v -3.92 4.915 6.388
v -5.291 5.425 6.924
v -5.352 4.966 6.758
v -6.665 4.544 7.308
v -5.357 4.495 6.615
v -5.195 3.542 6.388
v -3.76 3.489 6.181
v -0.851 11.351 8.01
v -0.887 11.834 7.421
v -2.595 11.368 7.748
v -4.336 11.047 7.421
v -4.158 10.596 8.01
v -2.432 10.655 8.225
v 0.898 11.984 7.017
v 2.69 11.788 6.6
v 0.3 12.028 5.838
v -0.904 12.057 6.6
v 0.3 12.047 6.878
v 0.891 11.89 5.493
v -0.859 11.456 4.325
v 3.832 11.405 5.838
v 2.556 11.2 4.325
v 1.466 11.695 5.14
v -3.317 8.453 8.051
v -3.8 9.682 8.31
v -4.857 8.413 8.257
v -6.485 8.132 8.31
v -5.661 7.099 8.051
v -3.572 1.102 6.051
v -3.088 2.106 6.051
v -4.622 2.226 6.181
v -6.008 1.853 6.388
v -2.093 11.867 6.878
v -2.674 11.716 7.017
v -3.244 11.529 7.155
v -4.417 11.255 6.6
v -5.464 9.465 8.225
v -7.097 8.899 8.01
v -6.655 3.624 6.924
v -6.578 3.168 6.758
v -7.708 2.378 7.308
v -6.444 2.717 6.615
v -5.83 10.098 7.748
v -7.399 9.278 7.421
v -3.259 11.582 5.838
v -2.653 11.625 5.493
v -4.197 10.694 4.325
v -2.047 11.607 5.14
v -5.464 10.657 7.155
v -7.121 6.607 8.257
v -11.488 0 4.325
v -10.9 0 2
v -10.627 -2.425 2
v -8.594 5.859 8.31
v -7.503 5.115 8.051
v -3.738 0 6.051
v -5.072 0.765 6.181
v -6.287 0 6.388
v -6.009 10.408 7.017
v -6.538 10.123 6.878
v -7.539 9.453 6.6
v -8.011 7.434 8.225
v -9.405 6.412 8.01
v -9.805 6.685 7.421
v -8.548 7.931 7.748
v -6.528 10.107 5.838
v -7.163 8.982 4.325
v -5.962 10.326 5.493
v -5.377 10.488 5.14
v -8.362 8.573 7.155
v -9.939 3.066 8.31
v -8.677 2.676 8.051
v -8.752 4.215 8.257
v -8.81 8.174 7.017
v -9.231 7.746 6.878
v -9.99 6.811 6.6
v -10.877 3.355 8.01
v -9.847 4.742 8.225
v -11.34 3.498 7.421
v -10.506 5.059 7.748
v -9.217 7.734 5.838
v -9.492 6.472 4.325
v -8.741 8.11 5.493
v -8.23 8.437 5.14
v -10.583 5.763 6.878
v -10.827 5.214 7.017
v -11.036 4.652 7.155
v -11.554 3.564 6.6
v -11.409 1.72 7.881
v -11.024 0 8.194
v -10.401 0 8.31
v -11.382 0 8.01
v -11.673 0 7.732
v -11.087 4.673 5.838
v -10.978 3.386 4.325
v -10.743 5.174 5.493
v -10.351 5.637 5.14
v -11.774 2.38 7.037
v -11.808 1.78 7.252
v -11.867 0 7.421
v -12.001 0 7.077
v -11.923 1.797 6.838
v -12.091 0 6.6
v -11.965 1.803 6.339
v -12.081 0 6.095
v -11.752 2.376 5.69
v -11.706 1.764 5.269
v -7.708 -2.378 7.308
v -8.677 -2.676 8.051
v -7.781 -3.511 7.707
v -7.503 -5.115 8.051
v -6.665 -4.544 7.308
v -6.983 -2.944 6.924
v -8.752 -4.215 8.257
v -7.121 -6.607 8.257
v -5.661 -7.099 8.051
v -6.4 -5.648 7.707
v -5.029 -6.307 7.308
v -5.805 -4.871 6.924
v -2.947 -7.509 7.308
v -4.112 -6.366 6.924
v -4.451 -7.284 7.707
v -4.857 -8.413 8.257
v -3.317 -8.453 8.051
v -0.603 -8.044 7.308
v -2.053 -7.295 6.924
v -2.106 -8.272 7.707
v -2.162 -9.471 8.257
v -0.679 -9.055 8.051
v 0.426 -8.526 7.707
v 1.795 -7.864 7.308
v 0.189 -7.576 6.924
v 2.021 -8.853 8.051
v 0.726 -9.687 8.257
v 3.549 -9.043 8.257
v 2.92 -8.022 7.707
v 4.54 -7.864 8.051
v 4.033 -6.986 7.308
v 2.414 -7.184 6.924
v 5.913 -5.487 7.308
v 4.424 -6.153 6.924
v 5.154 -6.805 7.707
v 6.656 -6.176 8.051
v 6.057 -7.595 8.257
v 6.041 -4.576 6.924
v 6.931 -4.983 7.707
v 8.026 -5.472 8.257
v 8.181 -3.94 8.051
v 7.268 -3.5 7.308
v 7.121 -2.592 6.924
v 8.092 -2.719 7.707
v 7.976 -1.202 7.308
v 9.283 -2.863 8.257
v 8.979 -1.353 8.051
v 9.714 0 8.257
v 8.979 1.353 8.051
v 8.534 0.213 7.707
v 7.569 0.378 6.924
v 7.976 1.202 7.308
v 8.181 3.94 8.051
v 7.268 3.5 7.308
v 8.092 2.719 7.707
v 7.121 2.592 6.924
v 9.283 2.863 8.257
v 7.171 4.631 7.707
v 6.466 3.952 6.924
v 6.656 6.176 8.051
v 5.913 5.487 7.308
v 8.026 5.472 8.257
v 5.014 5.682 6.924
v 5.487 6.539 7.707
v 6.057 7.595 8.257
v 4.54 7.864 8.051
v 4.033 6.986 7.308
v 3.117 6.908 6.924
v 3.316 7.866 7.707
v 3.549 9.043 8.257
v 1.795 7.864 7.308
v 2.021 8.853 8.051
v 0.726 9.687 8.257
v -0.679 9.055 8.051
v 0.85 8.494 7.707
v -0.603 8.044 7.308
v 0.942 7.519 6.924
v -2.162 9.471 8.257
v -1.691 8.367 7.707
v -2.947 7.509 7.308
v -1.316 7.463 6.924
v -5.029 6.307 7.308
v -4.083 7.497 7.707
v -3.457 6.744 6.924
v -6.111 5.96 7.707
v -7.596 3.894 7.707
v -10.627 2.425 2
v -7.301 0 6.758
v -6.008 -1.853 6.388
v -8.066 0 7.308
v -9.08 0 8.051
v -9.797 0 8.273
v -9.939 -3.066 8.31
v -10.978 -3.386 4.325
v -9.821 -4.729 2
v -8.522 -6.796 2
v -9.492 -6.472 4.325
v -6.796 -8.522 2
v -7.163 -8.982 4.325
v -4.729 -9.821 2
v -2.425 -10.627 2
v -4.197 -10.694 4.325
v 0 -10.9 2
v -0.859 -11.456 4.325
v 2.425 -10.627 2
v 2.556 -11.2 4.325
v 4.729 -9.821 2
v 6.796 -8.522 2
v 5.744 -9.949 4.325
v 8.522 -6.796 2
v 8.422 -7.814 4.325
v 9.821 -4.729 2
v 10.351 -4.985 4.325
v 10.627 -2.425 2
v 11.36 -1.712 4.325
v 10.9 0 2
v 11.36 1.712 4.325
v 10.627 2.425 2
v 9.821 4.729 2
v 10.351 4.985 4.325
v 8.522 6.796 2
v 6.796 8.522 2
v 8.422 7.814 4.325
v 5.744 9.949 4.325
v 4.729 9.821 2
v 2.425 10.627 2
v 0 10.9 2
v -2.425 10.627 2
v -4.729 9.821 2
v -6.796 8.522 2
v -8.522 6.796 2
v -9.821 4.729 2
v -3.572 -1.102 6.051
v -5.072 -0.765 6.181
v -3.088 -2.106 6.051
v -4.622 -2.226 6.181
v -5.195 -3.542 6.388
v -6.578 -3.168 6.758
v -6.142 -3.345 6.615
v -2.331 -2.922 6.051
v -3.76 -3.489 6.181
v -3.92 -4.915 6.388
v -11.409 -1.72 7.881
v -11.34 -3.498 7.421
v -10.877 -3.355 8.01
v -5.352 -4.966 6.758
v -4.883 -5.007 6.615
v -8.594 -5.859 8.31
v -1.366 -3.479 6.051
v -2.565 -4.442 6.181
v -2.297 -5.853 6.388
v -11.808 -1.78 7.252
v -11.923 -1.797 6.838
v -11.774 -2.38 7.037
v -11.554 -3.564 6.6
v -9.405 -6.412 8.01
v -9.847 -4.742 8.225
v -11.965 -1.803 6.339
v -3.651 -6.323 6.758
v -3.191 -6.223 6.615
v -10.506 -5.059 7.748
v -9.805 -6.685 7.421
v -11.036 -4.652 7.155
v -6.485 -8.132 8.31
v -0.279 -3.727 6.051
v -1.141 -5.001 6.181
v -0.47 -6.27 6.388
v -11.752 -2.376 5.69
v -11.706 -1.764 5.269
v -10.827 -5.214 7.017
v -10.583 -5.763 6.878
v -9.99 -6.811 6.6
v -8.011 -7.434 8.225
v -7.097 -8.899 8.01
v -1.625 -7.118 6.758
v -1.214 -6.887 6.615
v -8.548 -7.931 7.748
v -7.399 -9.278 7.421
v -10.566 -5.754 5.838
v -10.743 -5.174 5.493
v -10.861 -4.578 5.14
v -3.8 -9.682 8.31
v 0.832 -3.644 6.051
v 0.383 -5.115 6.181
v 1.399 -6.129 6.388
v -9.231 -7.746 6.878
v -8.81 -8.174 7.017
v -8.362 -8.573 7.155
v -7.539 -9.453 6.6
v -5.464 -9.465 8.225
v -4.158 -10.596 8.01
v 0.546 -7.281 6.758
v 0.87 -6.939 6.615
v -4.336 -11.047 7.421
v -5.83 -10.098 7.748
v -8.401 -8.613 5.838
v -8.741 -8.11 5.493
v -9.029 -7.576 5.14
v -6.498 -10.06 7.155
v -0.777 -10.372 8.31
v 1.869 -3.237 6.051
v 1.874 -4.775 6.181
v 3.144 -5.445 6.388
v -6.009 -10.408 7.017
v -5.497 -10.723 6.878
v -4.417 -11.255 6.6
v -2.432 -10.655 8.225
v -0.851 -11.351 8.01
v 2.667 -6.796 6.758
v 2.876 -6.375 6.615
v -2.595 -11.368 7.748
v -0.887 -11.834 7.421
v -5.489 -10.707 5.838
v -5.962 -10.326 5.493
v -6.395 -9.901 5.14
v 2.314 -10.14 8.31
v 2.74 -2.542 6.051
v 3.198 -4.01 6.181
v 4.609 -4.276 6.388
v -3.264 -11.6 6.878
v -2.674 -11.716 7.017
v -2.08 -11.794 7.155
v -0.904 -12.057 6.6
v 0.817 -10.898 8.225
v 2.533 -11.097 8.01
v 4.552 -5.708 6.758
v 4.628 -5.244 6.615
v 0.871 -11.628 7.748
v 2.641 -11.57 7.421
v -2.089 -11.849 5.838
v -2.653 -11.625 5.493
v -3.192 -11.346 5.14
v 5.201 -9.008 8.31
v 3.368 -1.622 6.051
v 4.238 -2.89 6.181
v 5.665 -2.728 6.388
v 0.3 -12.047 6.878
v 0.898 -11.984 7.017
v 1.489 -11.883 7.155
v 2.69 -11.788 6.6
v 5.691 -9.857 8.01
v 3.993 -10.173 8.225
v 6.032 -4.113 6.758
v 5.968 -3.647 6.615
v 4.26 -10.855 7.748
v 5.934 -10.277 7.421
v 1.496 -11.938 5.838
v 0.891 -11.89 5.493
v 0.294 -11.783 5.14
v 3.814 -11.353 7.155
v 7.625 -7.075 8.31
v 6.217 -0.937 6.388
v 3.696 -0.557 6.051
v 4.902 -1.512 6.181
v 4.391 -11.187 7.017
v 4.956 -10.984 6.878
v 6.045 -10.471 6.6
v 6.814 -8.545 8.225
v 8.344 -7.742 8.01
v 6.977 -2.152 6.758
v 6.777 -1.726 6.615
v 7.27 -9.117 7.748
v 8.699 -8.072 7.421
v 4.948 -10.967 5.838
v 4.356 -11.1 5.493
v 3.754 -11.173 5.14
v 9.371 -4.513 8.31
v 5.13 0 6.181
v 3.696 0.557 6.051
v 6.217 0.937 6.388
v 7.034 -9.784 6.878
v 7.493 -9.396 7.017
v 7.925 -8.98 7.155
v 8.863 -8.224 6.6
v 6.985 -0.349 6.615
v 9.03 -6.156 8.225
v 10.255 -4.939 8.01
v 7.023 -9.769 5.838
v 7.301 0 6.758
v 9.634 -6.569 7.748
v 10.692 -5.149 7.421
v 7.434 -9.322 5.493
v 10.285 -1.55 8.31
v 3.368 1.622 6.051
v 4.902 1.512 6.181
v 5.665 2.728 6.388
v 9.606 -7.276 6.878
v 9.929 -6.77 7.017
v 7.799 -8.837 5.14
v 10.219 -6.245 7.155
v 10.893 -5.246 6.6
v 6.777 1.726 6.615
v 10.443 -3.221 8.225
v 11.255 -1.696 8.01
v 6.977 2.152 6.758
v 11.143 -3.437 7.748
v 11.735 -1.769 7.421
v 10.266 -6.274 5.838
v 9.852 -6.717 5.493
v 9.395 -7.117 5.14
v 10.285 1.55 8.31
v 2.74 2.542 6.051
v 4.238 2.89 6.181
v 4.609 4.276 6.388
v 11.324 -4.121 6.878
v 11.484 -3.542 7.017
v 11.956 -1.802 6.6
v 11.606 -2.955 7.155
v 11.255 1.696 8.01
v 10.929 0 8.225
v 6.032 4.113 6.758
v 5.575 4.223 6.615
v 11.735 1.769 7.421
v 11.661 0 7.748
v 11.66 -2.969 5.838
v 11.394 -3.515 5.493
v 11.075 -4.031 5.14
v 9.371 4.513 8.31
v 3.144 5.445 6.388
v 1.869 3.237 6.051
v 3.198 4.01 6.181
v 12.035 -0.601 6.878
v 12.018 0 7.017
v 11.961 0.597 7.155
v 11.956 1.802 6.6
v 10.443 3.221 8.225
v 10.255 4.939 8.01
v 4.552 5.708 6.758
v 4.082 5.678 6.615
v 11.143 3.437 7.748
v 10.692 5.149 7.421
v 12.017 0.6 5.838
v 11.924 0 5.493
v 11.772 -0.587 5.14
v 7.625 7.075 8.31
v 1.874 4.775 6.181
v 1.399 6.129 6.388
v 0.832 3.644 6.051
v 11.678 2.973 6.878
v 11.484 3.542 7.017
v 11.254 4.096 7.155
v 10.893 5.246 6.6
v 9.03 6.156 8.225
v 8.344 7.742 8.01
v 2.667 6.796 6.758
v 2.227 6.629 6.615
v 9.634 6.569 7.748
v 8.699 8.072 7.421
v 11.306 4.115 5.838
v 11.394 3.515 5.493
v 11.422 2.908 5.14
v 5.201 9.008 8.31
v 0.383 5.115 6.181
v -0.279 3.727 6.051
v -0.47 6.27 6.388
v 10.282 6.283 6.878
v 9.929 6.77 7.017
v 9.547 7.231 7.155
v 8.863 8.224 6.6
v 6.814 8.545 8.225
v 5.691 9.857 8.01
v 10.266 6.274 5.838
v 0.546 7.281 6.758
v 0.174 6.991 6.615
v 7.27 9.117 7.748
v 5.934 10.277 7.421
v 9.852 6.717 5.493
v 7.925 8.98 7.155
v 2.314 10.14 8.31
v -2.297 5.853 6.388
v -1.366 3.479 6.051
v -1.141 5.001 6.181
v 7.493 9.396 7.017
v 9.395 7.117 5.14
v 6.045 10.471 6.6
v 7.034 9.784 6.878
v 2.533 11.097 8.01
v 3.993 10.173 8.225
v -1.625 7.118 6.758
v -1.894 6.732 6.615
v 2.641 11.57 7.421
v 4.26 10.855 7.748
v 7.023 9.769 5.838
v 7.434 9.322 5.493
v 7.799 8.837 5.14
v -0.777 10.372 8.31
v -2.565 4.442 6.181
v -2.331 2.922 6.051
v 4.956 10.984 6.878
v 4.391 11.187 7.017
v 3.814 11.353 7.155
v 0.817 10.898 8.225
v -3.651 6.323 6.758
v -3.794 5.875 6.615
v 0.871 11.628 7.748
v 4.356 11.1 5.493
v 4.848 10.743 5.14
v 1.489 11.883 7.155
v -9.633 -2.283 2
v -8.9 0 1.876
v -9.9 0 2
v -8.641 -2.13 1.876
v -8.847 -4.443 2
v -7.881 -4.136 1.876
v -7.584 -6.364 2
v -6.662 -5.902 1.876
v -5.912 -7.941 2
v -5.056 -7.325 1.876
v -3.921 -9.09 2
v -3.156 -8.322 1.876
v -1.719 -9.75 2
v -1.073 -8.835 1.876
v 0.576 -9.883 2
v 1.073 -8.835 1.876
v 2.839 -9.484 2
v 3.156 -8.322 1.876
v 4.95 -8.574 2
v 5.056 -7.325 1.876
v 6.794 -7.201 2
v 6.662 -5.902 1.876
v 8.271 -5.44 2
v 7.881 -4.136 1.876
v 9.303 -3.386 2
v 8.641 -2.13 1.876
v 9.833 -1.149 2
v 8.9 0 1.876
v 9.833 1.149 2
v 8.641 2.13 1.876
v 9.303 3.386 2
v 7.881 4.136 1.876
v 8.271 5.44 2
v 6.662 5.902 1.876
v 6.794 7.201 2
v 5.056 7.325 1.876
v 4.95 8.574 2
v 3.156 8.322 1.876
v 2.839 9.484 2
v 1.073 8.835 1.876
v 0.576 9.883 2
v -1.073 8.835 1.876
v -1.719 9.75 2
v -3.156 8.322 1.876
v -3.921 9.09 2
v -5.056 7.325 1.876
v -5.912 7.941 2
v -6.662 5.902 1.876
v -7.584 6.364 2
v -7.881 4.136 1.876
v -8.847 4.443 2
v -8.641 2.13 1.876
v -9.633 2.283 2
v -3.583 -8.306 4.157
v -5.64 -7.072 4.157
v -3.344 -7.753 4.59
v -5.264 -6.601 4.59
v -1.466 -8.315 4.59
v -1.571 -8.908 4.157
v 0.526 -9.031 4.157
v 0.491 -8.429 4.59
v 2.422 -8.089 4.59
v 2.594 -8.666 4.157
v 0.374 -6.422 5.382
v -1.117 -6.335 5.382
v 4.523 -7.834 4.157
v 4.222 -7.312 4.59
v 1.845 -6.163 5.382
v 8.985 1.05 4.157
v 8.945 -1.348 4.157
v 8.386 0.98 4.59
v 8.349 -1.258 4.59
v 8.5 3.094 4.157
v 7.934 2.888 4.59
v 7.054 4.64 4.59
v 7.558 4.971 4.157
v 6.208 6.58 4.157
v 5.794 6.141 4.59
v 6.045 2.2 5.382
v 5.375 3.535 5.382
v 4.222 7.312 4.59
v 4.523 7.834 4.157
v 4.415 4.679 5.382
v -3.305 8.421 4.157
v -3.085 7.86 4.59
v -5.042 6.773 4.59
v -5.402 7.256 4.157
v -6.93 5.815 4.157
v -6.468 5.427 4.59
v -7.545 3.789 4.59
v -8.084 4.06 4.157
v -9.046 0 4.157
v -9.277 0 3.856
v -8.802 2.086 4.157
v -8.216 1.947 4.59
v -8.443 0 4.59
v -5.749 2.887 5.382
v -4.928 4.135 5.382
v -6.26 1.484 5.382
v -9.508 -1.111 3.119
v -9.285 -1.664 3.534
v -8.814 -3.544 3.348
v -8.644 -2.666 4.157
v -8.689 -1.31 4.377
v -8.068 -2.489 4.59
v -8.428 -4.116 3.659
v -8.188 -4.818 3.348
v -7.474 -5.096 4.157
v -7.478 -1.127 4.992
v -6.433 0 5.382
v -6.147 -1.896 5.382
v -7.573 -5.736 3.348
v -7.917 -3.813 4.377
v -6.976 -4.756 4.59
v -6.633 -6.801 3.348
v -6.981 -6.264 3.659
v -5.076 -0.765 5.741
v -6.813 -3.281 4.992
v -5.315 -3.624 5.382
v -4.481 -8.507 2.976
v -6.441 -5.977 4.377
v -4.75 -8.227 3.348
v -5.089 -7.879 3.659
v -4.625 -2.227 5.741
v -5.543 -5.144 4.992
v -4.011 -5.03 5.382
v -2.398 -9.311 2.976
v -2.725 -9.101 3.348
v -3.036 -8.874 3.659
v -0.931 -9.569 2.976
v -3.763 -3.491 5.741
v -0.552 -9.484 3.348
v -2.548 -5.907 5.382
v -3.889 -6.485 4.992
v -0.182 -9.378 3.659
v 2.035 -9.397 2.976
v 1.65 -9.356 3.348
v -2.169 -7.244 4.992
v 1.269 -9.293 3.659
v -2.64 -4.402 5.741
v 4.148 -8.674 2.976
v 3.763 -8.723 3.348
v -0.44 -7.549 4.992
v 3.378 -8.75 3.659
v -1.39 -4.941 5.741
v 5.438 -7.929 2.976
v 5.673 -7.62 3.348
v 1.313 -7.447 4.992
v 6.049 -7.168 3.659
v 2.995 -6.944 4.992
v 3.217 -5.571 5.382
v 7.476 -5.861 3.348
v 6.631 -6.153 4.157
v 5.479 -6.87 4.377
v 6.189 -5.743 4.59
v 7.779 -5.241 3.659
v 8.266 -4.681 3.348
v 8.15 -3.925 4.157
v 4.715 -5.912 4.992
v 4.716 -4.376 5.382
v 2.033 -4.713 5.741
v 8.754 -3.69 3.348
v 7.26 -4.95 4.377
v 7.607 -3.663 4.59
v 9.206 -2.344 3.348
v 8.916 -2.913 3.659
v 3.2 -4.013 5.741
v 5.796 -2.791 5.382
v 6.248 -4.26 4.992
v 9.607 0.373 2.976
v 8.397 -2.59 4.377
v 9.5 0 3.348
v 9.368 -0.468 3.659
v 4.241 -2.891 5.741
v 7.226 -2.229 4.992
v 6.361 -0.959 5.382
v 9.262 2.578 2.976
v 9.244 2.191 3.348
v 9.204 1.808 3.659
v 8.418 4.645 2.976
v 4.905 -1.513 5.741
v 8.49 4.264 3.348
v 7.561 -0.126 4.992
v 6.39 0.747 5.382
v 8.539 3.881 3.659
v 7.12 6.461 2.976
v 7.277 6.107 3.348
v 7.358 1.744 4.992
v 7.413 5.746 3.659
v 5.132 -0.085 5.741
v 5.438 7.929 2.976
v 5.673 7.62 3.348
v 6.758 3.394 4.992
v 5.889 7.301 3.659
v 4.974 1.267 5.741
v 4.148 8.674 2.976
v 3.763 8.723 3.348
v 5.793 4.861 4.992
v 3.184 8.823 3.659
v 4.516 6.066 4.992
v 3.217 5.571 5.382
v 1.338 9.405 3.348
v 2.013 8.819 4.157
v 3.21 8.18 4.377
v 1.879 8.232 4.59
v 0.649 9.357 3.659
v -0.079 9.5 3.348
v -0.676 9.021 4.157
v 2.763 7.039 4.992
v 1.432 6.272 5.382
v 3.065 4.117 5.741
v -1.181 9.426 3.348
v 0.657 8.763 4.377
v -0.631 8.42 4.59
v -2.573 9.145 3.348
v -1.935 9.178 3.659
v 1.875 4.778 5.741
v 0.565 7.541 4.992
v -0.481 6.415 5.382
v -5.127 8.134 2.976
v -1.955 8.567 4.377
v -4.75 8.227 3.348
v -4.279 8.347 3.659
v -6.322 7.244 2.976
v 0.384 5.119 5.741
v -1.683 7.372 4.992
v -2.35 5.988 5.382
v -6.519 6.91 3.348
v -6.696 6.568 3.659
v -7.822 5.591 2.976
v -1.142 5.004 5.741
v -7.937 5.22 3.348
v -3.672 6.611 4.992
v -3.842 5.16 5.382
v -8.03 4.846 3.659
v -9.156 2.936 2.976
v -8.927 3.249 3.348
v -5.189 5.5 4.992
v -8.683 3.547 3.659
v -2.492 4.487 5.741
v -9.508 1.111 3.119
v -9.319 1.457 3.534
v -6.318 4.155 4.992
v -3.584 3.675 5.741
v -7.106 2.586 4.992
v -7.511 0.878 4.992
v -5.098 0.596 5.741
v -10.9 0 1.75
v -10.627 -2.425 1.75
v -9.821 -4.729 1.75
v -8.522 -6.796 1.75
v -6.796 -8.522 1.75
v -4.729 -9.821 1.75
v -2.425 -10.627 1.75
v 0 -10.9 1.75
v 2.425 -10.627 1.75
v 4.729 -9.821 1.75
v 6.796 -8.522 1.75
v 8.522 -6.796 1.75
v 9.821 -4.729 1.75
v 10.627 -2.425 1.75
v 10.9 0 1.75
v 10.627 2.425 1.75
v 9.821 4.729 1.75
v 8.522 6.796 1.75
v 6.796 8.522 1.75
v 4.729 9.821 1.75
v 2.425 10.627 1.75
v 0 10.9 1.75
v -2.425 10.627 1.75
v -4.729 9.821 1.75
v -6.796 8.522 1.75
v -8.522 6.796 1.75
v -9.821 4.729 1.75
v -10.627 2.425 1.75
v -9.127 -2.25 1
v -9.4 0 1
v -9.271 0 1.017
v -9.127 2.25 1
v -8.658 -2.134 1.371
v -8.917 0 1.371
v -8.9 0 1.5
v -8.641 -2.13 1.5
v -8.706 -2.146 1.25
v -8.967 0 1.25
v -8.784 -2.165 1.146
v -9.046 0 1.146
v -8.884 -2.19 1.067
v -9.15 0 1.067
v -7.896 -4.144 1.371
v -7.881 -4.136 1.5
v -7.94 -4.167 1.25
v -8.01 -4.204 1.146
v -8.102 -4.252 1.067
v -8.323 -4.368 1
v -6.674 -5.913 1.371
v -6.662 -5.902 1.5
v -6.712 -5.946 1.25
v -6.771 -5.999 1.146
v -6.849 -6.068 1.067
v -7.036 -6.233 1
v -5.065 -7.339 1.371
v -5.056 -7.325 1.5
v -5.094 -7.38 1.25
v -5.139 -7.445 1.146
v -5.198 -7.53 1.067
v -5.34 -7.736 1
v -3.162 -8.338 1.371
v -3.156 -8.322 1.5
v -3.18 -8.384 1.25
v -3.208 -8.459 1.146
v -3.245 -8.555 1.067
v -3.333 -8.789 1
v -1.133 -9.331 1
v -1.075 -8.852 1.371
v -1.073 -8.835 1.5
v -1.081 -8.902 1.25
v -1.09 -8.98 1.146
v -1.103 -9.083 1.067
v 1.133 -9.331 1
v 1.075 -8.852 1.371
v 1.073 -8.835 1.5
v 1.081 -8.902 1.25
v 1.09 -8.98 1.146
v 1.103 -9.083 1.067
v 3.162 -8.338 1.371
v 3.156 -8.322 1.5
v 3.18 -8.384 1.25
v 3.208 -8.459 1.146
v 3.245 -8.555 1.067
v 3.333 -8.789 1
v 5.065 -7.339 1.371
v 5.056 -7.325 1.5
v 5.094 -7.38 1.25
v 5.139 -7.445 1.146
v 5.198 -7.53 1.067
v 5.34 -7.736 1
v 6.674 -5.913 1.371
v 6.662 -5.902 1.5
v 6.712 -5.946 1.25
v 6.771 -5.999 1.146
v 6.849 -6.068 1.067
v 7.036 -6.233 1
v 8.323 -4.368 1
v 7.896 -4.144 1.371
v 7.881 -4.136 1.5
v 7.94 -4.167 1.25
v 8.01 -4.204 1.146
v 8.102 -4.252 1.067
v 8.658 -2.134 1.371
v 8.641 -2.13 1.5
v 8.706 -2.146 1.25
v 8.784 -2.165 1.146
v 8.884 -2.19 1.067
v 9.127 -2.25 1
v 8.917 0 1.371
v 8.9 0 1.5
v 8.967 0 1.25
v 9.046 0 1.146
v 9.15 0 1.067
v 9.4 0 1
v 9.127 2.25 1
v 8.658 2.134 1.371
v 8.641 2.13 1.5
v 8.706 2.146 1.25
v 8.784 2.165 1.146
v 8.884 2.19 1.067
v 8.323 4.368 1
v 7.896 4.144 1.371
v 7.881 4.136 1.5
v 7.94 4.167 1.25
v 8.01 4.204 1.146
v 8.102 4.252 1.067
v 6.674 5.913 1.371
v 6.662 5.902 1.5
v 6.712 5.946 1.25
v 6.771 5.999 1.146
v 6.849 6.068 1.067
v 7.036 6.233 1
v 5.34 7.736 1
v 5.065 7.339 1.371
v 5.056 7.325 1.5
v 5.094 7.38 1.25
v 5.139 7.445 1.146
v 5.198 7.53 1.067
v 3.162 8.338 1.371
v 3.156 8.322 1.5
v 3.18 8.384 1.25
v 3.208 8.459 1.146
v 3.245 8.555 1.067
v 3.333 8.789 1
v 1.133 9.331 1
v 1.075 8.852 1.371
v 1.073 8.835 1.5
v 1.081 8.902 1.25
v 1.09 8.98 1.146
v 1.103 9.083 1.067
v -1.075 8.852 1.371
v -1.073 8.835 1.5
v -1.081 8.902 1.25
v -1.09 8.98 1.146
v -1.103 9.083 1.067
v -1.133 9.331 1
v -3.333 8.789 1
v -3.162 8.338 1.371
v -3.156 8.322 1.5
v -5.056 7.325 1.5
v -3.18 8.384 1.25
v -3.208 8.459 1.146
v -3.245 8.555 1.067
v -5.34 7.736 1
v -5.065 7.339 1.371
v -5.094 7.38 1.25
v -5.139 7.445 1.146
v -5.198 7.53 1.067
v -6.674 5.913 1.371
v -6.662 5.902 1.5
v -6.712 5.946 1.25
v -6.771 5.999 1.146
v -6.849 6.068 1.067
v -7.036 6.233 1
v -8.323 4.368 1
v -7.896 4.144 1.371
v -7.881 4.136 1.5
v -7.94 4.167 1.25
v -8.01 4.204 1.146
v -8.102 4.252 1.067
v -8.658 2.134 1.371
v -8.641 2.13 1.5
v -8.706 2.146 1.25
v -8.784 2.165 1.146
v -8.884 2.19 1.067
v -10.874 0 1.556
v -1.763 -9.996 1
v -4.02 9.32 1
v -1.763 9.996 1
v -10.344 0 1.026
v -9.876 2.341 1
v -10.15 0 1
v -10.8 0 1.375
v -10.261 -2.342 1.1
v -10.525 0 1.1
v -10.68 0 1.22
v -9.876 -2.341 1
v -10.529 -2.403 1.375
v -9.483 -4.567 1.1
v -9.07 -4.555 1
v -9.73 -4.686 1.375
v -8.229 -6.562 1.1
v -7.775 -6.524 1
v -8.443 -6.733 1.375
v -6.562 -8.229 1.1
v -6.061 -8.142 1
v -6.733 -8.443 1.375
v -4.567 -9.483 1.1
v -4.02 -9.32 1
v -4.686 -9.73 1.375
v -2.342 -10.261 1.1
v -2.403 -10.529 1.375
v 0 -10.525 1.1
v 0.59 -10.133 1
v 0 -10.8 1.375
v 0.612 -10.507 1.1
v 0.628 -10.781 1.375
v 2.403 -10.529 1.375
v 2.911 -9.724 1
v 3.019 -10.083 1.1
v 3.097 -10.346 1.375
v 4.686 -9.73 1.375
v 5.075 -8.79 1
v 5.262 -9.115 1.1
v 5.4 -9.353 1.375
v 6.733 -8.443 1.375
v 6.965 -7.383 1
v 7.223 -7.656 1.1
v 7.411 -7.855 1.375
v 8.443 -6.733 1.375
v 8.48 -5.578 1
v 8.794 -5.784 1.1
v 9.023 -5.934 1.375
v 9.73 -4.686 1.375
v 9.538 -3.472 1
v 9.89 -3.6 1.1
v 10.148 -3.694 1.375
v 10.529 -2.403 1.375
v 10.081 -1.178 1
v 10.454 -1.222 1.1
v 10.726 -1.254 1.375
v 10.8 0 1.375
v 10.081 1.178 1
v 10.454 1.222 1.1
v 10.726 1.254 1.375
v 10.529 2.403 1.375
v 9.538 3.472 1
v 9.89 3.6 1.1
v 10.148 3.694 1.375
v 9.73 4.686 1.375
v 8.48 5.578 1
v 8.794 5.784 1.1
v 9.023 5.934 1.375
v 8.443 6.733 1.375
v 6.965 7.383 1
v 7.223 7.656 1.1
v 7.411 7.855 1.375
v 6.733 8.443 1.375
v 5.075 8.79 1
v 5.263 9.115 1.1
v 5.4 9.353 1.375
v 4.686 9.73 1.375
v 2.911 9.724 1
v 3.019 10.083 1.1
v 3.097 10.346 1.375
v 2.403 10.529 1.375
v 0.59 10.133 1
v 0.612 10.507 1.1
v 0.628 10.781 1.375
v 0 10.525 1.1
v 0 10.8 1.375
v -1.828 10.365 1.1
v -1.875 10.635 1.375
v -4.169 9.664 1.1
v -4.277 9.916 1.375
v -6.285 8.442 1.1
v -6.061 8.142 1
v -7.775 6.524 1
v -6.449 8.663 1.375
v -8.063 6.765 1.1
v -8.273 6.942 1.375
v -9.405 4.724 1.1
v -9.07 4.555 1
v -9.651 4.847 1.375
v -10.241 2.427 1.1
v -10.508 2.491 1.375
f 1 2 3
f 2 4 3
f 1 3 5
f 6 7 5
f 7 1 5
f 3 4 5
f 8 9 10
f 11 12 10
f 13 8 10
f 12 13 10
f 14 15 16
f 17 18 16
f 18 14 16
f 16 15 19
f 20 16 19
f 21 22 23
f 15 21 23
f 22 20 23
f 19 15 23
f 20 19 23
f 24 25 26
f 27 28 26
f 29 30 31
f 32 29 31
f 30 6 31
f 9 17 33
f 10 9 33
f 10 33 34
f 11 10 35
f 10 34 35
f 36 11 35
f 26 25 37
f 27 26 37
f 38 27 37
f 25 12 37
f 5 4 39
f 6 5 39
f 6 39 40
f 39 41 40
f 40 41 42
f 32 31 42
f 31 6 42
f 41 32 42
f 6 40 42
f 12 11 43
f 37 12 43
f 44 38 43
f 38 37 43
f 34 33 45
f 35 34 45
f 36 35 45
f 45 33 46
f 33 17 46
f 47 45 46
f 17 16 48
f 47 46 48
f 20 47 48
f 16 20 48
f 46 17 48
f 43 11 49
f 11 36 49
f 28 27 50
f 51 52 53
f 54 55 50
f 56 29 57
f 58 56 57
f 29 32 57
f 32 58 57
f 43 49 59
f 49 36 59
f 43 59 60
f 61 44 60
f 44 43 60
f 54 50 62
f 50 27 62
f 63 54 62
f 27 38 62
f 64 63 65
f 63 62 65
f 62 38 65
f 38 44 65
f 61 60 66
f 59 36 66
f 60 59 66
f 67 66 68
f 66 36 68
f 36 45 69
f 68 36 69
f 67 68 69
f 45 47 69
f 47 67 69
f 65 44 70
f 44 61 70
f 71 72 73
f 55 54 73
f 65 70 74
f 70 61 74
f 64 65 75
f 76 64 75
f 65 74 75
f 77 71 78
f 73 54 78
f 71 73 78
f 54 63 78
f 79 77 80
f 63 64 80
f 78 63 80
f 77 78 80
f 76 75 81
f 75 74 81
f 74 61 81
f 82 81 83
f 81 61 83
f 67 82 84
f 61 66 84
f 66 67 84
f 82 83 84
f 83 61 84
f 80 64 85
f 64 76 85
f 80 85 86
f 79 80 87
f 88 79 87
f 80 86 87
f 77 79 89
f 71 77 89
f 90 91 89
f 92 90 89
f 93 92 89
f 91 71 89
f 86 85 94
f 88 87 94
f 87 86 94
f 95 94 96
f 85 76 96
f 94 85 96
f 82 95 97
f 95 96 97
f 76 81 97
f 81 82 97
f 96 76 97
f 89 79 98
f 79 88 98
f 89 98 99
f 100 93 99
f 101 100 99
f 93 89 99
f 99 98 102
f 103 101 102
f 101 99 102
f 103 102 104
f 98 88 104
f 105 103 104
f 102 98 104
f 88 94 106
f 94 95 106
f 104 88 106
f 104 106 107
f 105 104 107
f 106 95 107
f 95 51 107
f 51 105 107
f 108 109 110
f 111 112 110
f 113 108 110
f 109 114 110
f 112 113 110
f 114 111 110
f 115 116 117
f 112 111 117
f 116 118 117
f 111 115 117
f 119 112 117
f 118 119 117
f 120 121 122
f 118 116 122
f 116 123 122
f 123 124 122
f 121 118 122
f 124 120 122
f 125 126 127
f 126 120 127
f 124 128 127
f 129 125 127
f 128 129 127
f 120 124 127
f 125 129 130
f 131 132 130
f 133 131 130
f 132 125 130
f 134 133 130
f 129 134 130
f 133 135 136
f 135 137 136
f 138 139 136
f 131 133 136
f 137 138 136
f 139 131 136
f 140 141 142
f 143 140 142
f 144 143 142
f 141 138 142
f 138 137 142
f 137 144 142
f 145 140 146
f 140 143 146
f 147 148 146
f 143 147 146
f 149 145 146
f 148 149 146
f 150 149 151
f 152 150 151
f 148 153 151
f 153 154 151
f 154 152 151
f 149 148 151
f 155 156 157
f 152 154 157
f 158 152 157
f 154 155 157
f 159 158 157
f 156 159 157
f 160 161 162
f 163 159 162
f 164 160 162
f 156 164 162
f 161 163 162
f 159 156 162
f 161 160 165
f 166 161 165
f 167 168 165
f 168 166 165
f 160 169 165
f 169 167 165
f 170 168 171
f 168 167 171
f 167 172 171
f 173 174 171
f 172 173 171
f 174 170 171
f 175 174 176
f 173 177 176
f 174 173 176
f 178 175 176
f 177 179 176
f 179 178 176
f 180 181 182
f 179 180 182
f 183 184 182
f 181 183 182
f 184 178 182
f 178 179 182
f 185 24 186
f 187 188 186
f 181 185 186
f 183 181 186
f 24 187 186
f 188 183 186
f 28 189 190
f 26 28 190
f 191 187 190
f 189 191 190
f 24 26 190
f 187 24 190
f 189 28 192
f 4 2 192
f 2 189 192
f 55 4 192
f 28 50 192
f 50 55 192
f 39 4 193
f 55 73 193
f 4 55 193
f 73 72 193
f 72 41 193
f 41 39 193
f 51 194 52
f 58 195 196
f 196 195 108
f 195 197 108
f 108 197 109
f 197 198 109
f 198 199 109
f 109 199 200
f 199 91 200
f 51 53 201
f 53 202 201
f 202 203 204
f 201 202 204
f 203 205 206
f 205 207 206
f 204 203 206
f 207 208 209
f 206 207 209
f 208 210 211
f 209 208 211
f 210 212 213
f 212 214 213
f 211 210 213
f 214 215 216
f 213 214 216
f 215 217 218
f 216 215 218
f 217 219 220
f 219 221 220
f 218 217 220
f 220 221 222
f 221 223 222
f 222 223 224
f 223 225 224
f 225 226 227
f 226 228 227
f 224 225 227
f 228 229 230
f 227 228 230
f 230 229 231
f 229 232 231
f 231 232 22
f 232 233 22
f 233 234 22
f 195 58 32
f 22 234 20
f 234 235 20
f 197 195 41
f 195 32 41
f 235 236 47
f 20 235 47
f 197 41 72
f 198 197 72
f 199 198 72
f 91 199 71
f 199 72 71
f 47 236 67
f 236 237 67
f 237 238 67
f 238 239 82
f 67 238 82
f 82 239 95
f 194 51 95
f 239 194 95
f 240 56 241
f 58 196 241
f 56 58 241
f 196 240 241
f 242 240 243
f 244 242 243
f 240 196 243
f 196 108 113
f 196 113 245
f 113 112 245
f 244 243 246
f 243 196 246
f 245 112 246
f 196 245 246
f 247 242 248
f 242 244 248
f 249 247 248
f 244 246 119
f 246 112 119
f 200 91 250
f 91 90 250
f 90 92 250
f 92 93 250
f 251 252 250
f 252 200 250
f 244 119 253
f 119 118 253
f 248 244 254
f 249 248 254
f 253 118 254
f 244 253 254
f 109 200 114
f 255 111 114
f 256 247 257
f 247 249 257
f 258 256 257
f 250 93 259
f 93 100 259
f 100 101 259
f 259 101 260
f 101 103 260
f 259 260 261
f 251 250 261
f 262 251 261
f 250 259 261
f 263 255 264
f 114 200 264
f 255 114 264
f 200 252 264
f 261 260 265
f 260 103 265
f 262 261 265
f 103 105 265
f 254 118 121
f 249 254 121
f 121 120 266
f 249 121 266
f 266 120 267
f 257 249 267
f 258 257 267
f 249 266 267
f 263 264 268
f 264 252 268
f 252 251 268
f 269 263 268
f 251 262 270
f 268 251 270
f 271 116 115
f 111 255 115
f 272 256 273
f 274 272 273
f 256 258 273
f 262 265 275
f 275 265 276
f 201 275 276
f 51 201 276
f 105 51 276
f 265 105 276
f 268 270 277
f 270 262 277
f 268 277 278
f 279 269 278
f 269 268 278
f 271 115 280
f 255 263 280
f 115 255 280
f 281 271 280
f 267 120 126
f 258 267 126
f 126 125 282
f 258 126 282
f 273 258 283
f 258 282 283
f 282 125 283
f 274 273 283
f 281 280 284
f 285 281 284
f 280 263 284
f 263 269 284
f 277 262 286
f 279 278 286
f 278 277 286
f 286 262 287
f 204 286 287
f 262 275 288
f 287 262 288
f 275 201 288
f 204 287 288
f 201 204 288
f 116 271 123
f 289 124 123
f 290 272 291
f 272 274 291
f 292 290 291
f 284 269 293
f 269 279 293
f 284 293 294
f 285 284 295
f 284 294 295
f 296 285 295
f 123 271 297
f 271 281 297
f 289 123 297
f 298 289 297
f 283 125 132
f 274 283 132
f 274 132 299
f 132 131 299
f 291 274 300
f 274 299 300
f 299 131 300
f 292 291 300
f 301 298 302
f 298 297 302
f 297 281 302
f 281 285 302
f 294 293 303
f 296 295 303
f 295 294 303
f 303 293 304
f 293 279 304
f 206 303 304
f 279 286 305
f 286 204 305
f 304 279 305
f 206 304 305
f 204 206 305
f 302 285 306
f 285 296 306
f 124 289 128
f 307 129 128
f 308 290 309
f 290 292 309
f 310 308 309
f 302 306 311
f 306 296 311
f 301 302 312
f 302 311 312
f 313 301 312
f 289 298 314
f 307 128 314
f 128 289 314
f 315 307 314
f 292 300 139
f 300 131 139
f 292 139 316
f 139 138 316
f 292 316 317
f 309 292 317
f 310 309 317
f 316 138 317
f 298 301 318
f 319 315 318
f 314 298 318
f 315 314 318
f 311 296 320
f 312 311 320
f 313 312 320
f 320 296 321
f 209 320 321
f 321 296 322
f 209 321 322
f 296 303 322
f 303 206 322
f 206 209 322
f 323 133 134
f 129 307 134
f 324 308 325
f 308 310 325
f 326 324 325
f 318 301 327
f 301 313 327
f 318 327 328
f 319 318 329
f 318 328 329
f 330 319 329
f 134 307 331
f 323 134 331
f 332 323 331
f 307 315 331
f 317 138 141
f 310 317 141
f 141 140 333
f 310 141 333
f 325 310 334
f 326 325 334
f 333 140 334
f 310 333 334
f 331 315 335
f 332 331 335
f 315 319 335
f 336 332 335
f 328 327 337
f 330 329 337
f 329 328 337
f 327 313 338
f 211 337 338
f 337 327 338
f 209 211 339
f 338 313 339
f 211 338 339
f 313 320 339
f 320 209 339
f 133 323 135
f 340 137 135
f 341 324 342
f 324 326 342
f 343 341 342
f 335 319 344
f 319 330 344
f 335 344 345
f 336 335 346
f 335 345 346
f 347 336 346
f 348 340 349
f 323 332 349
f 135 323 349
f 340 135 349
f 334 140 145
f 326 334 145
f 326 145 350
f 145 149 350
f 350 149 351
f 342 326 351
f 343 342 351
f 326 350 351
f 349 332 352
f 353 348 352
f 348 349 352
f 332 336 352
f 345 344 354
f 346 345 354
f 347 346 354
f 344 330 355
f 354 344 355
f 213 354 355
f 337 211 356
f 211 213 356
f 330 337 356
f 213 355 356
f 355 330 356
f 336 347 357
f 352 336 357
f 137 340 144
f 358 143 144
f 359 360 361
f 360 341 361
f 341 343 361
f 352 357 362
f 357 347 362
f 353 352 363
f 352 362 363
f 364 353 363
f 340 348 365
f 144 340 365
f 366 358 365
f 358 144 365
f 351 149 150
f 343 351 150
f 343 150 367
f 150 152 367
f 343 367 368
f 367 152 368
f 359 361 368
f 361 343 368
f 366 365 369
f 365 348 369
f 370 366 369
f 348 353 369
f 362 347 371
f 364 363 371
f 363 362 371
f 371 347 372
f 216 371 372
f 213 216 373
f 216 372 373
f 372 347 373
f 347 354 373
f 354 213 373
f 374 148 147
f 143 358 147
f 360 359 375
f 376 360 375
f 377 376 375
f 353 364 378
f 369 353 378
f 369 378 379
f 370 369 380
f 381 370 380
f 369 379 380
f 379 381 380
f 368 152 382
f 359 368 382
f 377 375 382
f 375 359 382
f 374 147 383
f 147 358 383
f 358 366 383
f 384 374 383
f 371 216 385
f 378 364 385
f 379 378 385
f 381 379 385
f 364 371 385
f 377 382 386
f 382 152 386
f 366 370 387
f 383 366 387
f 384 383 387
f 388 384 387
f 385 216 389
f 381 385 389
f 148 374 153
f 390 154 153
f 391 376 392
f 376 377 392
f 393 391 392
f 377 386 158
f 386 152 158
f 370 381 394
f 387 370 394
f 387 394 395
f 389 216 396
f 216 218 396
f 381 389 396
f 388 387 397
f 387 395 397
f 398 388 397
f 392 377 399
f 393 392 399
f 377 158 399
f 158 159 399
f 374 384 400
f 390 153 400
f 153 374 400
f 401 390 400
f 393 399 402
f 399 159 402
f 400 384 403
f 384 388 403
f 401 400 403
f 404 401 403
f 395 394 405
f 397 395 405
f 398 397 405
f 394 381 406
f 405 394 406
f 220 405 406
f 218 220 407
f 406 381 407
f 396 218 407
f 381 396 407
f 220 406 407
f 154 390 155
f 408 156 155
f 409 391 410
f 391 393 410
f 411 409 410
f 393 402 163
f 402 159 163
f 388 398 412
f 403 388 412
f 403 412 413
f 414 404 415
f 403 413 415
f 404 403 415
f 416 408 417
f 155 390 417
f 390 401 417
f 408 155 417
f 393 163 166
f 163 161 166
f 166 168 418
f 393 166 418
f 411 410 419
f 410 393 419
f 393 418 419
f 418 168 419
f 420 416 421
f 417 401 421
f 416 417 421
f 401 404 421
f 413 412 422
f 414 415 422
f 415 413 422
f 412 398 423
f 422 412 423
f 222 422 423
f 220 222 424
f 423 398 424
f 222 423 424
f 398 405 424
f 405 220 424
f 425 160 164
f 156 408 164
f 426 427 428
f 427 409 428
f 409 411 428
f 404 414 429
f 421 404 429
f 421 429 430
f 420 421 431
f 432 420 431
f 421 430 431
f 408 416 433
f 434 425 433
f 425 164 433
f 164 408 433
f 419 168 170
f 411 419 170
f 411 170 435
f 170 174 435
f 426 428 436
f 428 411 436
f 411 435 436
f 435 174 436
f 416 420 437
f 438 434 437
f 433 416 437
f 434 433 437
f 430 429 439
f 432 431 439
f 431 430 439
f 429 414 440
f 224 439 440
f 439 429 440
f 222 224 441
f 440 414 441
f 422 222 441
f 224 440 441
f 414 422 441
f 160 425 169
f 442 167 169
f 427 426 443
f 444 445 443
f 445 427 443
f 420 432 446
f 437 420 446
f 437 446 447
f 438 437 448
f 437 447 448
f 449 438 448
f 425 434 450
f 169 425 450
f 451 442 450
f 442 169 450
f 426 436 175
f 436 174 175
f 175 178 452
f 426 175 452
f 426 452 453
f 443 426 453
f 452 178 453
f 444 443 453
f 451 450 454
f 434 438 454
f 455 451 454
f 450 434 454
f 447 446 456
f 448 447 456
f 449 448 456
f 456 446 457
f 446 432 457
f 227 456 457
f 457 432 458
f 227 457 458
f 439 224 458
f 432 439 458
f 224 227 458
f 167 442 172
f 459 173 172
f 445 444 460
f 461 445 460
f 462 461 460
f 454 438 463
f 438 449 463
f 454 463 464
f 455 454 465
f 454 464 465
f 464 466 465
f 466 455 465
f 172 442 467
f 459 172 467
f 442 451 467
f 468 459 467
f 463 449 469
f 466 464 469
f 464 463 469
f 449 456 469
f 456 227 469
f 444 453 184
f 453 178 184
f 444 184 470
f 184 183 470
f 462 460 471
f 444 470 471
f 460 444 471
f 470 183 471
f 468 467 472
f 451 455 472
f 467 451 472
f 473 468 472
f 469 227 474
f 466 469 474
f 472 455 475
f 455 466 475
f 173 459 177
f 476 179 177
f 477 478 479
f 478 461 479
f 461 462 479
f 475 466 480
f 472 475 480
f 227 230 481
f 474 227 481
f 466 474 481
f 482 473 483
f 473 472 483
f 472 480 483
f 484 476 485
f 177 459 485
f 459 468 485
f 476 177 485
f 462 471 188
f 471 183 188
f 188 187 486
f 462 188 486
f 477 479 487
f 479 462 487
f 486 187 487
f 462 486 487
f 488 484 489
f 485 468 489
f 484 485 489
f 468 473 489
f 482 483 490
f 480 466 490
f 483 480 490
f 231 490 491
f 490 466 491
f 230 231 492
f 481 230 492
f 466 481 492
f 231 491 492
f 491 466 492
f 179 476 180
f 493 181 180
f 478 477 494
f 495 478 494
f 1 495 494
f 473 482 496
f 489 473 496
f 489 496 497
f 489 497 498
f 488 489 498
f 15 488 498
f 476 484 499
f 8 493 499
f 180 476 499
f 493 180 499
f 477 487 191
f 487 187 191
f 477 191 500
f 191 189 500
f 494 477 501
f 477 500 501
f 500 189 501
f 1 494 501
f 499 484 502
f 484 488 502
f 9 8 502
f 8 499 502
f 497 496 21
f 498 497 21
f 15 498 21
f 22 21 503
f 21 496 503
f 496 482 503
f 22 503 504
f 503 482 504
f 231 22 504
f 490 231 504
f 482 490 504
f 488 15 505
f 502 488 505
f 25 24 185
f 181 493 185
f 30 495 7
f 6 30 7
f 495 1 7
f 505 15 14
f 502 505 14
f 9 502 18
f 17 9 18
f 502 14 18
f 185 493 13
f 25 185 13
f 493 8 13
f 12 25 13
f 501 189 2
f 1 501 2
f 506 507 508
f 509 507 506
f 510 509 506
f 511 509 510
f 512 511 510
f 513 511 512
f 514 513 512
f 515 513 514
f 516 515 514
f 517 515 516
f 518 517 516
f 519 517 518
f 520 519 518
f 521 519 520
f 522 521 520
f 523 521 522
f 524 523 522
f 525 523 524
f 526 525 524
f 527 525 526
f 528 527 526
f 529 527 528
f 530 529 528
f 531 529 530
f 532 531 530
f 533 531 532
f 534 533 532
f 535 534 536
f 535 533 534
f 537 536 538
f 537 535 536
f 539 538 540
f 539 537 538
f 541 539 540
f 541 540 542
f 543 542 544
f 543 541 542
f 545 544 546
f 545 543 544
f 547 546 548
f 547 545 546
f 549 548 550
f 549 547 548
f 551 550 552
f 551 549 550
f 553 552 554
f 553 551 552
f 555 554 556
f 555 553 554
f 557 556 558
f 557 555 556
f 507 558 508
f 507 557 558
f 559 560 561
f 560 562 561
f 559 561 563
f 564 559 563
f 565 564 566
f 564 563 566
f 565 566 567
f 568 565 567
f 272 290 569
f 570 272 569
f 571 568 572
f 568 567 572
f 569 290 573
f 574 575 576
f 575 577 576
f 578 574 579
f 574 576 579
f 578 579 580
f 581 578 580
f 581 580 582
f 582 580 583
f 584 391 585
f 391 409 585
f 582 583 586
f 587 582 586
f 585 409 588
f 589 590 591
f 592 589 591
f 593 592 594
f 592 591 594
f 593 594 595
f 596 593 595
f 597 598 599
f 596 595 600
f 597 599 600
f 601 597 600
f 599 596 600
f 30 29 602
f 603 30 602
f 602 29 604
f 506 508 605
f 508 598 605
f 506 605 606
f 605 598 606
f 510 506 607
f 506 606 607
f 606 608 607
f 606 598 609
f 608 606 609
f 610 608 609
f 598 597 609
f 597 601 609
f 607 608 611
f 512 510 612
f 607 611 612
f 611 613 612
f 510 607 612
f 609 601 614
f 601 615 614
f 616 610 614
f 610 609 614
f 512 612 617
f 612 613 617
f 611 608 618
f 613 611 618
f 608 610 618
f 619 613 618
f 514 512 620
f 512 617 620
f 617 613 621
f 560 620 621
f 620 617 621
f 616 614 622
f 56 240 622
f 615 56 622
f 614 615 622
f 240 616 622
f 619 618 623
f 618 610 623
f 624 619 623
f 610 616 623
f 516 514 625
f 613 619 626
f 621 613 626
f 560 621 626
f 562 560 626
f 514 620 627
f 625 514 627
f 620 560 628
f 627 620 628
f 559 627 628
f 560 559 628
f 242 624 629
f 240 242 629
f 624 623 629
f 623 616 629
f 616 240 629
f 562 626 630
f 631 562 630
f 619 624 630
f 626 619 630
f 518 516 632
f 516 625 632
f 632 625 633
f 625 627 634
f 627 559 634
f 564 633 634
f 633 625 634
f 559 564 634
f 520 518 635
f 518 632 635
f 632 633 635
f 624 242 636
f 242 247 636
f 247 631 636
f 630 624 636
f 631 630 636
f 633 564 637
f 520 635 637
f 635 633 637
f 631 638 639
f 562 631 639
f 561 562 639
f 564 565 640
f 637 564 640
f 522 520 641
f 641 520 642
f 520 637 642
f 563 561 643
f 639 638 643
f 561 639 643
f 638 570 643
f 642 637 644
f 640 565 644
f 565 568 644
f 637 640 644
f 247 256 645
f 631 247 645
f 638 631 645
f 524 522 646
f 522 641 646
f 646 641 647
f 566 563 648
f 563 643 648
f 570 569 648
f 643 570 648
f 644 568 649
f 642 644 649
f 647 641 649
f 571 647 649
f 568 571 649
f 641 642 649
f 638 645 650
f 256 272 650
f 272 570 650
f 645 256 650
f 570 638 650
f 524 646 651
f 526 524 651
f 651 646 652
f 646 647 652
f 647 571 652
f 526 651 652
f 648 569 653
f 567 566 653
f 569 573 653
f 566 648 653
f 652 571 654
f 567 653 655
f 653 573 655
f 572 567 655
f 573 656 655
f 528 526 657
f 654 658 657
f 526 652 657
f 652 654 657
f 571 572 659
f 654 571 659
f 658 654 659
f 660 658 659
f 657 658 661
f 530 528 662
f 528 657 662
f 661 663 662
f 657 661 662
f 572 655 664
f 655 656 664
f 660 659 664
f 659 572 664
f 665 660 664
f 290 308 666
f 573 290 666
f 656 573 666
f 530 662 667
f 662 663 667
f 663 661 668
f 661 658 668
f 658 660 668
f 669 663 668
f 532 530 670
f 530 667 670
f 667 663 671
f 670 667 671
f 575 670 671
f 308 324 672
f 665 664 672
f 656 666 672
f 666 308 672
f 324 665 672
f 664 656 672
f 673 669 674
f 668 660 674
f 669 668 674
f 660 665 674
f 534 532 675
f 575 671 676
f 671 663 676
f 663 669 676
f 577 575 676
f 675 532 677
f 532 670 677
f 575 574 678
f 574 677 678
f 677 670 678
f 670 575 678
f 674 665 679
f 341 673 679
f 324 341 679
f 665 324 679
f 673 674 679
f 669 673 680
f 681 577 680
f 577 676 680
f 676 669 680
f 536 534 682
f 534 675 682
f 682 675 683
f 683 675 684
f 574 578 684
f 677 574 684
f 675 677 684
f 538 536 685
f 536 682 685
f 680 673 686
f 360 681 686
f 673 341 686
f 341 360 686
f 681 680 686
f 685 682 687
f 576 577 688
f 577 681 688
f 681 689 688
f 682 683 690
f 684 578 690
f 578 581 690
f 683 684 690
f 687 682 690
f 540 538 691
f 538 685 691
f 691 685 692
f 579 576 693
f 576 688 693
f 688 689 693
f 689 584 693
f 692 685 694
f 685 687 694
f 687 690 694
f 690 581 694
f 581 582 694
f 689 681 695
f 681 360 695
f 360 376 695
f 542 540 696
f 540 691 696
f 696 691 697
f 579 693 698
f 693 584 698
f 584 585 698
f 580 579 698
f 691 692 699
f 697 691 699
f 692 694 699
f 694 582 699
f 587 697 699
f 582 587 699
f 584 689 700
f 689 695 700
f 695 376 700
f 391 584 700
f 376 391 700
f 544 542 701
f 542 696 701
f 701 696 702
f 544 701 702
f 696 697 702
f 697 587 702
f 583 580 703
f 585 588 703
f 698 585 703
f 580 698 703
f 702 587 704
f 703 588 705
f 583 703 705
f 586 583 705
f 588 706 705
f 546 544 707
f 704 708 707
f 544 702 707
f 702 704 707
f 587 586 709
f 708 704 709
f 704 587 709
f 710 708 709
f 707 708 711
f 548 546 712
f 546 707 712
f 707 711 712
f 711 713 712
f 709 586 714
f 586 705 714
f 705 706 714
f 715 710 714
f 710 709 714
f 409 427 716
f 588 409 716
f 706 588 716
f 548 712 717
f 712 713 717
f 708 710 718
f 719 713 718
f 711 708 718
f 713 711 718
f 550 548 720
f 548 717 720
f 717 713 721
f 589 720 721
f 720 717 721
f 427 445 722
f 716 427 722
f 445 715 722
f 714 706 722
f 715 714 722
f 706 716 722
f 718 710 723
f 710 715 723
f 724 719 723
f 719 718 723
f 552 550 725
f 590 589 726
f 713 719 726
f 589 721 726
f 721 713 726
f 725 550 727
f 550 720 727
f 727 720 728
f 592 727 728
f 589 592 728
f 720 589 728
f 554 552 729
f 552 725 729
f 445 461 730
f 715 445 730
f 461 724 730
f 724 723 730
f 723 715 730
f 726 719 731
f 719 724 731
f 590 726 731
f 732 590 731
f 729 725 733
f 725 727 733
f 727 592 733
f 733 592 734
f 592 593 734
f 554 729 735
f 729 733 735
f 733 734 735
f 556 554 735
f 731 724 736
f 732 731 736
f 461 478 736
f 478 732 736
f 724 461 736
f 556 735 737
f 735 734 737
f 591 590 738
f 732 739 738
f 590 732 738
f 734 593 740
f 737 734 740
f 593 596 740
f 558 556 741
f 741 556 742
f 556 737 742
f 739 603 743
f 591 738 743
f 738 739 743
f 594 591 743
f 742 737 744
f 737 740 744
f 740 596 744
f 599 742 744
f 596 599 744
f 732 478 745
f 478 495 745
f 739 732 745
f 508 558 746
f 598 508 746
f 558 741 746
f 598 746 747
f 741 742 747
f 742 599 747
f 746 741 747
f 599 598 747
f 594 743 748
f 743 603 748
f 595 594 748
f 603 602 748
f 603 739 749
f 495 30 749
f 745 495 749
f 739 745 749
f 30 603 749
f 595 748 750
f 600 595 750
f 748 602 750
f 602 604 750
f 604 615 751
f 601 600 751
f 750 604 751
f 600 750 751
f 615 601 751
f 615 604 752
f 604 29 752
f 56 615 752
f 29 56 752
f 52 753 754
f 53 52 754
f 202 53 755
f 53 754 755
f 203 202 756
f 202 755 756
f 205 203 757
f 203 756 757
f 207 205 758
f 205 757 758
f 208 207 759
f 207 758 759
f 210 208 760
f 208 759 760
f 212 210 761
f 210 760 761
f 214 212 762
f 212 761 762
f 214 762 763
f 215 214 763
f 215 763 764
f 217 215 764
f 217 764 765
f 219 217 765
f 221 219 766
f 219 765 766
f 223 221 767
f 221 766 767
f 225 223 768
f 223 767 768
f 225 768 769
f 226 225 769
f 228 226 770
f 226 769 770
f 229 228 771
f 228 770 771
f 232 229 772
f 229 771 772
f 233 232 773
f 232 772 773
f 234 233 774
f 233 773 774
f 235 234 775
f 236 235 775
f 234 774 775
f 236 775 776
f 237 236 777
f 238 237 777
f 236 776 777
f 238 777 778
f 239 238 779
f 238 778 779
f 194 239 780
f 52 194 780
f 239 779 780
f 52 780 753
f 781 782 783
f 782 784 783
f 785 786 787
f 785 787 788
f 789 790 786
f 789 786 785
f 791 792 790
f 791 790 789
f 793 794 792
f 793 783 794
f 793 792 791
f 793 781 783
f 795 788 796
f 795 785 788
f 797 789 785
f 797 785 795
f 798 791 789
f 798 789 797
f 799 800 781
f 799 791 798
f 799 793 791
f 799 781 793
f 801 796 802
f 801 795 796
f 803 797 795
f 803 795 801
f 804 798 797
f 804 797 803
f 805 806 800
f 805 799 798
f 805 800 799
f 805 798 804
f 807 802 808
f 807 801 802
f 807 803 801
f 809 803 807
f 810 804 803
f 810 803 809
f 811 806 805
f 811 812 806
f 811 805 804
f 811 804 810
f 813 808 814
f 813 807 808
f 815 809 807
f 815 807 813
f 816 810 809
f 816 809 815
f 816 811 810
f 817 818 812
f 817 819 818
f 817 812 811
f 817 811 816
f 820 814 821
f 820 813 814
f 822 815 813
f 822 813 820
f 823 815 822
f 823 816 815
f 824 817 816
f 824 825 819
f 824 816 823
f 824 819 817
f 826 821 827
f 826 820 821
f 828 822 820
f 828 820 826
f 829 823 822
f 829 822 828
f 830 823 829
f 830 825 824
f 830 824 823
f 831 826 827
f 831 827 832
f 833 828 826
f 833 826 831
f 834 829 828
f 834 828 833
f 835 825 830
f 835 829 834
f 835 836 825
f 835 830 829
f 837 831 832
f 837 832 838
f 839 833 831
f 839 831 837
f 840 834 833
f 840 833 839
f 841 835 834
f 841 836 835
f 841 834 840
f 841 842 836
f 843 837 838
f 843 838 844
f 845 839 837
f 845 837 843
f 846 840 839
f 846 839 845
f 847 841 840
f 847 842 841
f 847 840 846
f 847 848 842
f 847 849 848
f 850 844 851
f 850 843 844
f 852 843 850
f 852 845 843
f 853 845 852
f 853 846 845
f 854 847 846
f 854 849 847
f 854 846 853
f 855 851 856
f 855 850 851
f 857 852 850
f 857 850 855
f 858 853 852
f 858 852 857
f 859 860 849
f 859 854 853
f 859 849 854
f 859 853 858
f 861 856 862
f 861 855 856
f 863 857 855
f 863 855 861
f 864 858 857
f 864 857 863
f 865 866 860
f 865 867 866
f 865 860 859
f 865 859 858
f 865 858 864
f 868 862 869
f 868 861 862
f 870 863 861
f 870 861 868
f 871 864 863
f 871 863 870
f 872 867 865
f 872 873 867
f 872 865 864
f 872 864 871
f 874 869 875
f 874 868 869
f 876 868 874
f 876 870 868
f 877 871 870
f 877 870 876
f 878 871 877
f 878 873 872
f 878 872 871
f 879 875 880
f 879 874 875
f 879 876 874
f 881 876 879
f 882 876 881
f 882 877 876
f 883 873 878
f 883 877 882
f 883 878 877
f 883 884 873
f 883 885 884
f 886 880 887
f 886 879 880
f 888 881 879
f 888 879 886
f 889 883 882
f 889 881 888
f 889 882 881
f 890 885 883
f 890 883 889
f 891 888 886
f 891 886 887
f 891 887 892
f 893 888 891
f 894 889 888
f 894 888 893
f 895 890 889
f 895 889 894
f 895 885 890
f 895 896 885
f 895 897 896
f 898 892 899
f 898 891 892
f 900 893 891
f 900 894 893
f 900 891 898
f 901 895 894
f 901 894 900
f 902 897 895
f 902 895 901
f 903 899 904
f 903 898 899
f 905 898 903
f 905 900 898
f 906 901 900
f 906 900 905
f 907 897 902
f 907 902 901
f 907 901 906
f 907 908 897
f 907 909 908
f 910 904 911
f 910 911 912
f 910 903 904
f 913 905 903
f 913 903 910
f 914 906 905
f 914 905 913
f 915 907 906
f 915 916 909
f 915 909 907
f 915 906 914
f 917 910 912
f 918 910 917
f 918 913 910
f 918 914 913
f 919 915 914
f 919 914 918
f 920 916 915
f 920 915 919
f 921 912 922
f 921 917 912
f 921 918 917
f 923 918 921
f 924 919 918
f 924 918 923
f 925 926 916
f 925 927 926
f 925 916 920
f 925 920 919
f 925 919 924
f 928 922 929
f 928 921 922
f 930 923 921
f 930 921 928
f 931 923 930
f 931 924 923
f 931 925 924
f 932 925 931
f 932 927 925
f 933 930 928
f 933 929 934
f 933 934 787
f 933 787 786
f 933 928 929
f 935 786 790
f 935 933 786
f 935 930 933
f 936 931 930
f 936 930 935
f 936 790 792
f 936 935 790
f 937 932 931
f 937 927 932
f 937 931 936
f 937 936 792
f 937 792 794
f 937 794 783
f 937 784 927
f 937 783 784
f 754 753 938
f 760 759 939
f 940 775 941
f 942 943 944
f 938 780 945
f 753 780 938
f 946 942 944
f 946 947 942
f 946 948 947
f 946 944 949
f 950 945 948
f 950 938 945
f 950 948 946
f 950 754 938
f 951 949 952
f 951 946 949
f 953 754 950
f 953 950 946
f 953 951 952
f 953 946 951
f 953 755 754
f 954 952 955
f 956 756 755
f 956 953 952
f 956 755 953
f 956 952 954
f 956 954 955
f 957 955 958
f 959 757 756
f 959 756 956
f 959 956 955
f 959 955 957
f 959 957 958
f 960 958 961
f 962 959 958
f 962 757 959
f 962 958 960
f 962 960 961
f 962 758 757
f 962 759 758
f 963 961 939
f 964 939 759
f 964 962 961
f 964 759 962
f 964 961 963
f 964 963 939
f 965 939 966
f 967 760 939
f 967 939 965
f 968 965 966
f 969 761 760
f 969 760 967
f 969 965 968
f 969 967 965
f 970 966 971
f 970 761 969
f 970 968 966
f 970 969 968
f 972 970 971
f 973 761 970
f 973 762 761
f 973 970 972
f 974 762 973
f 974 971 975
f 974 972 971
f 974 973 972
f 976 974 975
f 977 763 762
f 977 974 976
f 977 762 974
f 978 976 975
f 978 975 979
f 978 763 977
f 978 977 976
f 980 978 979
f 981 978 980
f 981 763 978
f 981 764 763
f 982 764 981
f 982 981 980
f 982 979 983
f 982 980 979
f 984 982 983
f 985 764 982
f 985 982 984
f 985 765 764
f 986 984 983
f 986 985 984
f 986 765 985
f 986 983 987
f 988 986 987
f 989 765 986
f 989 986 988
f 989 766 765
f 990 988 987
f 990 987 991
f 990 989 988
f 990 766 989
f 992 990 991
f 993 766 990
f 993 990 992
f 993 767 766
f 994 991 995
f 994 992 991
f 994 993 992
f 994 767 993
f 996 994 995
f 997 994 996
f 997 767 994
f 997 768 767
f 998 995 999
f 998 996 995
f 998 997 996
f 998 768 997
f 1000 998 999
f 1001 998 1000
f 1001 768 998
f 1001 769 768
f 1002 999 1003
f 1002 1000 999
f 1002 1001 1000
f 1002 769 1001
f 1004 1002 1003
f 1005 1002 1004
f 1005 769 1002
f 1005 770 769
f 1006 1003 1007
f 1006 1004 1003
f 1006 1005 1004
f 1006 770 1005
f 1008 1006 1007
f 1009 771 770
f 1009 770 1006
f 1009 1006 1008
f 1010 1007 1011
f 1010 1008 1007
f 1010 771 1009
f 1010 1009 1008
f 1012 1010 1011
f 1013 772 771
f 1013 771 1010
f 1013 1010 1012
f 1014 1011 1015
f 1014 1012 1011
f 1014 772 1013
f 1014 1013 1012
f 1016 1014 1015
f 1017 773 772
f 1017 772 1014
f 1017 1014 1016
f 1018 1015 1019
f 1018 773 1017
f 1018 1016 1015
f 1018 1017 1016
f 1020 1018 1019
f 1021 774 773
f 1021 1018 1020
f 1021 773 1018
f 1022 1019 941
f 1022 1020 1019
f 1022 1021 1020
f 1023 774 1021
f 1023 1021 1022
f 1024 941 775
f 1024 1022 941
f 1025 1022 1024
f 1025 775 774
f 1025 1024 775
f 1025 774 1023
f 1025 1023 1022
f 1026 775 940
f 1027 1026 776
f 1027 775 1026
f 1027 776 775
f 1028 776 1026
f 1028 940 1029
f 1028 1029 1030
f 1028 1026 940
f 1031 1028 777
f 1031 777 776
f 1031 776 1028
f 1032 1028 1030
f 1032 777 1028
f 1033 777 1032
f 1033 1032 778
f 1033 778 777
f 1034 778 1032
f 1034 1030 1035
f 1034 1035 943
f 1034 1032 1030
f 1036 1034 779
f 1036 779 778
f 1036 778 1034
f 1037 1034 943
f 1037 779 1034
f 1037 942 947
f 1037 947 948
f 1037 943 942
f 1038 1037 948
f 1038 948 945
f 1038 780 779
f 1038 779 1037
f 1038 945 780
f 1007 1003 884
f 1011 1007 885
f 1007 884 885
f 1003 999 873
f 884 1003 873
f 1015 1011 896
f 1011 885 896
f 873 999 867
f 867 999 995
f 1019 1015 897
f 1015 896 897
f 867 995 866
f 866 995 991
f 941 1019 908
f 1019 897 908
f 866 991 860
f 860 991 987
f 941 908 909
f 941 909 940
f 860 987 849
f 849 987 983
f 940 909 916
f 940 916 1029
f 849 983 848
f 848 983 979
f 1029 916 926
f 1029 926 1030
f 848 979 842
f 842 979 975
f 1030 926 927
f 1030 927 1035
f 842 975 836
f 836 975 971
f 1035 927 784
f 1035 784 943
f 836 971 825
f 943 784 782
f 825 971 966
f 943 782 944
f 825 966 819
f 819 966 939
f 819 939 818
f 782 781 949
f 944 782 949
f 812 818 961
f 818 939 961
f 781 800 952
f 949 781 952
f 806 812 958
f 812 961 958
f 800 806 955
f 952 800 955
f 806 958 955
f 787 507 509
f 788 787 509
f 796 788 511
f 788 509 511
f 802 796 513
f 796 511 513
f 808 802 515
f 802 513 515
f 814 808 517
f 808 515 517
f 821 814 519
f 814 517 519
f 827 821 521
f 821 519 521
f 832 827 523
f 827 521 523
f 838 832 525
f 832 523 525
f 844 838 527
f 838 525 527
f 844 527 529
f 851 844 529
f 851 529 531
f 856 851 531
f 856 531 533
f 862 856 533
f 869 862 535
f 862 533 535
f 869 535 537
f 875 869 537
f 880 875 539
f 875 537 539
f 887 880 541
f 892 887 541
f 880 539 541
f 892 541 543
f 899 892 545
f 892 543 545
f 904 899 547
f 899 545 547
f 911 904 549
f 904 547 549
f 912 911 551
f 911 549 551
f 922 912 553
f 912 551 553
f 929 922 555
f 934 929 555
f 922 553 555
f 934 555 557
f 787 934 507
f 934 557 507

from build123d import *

# Parameters (mm, degrees)
F3_R = 0.5
F4_R = 0.75


with BuildPart() as f1:
    # F0 (on Front) → F1 (revolve)
    with BuildSketch(Plane.XZ):
        with BuildLine():
            add(Edge.make_bspline(
                [(-9.9, 2), (-9.5758501784, 2), (-9.2390440685, 1.9540368163), (-8.9, 1.8756836241)],
                knots=[0, 0, 0, 0, 0.9057827175, 0.9057827175, 0.9057827175, 0.9057827175], degree=3))
            add(Edge.make_bspline(
                [(-9.9, 2), (-9.4425315337, 3.4727421793), (-9.4923738418, 4.5062098982), (-5.7338769398, 5.657842442), (-3.7378328669, 6.0512309775)],
                knots=[0, 0, 0, 0, 0.3609898147, 0.7464263039, 0.7464263039, 0.7464263039, 0.7464263039], degree=3))
            add(Edge.make_bspline(
                [(-3.7378328669, 6.0512309775), (-5.4080331592, 6.1678928498), (-7.540306393, 6.4773144128), (-8.8608693051, 8.3364996593), (-11.6840963626, 8.4712647723), (-12.321294733, 6.1724447902), (-11.5347135554, 4.7688239601), (-11.0895165965, 2.8869020172), (-10.9, 2)],
                knots=[0, 0, 0, 0, 0.2118936526, 0.3670977167, 0.5306355286, 0.6792791718, 0.8175861129, 1, 1, 1, 1], degree=3))
            Line((-10.9, 2), (-10.9, 1))
            Line((-10.9, 1), (-8.9, 1))
            Line((-8.9, 1), (-8.9, 1.8756836241))
        make_face()
    revolve(axis=Axis((0, 0, 3.25), (0, 0, 1)))

    # F3
    f3_edges = [f1.edges().sort_by_distance(p)[0] for p in [
        (8.9, 0, 1),
    ]]
    fillet(f3_edges, radius=F3_R)

    # F4
    f4_edges = [f1.edges().sort_by_distance(p)[0] for p in [
        (10.9, 0, 1),
    ]]
    fillet(f4_edges, radius=F4_R)


solid = f1.part
